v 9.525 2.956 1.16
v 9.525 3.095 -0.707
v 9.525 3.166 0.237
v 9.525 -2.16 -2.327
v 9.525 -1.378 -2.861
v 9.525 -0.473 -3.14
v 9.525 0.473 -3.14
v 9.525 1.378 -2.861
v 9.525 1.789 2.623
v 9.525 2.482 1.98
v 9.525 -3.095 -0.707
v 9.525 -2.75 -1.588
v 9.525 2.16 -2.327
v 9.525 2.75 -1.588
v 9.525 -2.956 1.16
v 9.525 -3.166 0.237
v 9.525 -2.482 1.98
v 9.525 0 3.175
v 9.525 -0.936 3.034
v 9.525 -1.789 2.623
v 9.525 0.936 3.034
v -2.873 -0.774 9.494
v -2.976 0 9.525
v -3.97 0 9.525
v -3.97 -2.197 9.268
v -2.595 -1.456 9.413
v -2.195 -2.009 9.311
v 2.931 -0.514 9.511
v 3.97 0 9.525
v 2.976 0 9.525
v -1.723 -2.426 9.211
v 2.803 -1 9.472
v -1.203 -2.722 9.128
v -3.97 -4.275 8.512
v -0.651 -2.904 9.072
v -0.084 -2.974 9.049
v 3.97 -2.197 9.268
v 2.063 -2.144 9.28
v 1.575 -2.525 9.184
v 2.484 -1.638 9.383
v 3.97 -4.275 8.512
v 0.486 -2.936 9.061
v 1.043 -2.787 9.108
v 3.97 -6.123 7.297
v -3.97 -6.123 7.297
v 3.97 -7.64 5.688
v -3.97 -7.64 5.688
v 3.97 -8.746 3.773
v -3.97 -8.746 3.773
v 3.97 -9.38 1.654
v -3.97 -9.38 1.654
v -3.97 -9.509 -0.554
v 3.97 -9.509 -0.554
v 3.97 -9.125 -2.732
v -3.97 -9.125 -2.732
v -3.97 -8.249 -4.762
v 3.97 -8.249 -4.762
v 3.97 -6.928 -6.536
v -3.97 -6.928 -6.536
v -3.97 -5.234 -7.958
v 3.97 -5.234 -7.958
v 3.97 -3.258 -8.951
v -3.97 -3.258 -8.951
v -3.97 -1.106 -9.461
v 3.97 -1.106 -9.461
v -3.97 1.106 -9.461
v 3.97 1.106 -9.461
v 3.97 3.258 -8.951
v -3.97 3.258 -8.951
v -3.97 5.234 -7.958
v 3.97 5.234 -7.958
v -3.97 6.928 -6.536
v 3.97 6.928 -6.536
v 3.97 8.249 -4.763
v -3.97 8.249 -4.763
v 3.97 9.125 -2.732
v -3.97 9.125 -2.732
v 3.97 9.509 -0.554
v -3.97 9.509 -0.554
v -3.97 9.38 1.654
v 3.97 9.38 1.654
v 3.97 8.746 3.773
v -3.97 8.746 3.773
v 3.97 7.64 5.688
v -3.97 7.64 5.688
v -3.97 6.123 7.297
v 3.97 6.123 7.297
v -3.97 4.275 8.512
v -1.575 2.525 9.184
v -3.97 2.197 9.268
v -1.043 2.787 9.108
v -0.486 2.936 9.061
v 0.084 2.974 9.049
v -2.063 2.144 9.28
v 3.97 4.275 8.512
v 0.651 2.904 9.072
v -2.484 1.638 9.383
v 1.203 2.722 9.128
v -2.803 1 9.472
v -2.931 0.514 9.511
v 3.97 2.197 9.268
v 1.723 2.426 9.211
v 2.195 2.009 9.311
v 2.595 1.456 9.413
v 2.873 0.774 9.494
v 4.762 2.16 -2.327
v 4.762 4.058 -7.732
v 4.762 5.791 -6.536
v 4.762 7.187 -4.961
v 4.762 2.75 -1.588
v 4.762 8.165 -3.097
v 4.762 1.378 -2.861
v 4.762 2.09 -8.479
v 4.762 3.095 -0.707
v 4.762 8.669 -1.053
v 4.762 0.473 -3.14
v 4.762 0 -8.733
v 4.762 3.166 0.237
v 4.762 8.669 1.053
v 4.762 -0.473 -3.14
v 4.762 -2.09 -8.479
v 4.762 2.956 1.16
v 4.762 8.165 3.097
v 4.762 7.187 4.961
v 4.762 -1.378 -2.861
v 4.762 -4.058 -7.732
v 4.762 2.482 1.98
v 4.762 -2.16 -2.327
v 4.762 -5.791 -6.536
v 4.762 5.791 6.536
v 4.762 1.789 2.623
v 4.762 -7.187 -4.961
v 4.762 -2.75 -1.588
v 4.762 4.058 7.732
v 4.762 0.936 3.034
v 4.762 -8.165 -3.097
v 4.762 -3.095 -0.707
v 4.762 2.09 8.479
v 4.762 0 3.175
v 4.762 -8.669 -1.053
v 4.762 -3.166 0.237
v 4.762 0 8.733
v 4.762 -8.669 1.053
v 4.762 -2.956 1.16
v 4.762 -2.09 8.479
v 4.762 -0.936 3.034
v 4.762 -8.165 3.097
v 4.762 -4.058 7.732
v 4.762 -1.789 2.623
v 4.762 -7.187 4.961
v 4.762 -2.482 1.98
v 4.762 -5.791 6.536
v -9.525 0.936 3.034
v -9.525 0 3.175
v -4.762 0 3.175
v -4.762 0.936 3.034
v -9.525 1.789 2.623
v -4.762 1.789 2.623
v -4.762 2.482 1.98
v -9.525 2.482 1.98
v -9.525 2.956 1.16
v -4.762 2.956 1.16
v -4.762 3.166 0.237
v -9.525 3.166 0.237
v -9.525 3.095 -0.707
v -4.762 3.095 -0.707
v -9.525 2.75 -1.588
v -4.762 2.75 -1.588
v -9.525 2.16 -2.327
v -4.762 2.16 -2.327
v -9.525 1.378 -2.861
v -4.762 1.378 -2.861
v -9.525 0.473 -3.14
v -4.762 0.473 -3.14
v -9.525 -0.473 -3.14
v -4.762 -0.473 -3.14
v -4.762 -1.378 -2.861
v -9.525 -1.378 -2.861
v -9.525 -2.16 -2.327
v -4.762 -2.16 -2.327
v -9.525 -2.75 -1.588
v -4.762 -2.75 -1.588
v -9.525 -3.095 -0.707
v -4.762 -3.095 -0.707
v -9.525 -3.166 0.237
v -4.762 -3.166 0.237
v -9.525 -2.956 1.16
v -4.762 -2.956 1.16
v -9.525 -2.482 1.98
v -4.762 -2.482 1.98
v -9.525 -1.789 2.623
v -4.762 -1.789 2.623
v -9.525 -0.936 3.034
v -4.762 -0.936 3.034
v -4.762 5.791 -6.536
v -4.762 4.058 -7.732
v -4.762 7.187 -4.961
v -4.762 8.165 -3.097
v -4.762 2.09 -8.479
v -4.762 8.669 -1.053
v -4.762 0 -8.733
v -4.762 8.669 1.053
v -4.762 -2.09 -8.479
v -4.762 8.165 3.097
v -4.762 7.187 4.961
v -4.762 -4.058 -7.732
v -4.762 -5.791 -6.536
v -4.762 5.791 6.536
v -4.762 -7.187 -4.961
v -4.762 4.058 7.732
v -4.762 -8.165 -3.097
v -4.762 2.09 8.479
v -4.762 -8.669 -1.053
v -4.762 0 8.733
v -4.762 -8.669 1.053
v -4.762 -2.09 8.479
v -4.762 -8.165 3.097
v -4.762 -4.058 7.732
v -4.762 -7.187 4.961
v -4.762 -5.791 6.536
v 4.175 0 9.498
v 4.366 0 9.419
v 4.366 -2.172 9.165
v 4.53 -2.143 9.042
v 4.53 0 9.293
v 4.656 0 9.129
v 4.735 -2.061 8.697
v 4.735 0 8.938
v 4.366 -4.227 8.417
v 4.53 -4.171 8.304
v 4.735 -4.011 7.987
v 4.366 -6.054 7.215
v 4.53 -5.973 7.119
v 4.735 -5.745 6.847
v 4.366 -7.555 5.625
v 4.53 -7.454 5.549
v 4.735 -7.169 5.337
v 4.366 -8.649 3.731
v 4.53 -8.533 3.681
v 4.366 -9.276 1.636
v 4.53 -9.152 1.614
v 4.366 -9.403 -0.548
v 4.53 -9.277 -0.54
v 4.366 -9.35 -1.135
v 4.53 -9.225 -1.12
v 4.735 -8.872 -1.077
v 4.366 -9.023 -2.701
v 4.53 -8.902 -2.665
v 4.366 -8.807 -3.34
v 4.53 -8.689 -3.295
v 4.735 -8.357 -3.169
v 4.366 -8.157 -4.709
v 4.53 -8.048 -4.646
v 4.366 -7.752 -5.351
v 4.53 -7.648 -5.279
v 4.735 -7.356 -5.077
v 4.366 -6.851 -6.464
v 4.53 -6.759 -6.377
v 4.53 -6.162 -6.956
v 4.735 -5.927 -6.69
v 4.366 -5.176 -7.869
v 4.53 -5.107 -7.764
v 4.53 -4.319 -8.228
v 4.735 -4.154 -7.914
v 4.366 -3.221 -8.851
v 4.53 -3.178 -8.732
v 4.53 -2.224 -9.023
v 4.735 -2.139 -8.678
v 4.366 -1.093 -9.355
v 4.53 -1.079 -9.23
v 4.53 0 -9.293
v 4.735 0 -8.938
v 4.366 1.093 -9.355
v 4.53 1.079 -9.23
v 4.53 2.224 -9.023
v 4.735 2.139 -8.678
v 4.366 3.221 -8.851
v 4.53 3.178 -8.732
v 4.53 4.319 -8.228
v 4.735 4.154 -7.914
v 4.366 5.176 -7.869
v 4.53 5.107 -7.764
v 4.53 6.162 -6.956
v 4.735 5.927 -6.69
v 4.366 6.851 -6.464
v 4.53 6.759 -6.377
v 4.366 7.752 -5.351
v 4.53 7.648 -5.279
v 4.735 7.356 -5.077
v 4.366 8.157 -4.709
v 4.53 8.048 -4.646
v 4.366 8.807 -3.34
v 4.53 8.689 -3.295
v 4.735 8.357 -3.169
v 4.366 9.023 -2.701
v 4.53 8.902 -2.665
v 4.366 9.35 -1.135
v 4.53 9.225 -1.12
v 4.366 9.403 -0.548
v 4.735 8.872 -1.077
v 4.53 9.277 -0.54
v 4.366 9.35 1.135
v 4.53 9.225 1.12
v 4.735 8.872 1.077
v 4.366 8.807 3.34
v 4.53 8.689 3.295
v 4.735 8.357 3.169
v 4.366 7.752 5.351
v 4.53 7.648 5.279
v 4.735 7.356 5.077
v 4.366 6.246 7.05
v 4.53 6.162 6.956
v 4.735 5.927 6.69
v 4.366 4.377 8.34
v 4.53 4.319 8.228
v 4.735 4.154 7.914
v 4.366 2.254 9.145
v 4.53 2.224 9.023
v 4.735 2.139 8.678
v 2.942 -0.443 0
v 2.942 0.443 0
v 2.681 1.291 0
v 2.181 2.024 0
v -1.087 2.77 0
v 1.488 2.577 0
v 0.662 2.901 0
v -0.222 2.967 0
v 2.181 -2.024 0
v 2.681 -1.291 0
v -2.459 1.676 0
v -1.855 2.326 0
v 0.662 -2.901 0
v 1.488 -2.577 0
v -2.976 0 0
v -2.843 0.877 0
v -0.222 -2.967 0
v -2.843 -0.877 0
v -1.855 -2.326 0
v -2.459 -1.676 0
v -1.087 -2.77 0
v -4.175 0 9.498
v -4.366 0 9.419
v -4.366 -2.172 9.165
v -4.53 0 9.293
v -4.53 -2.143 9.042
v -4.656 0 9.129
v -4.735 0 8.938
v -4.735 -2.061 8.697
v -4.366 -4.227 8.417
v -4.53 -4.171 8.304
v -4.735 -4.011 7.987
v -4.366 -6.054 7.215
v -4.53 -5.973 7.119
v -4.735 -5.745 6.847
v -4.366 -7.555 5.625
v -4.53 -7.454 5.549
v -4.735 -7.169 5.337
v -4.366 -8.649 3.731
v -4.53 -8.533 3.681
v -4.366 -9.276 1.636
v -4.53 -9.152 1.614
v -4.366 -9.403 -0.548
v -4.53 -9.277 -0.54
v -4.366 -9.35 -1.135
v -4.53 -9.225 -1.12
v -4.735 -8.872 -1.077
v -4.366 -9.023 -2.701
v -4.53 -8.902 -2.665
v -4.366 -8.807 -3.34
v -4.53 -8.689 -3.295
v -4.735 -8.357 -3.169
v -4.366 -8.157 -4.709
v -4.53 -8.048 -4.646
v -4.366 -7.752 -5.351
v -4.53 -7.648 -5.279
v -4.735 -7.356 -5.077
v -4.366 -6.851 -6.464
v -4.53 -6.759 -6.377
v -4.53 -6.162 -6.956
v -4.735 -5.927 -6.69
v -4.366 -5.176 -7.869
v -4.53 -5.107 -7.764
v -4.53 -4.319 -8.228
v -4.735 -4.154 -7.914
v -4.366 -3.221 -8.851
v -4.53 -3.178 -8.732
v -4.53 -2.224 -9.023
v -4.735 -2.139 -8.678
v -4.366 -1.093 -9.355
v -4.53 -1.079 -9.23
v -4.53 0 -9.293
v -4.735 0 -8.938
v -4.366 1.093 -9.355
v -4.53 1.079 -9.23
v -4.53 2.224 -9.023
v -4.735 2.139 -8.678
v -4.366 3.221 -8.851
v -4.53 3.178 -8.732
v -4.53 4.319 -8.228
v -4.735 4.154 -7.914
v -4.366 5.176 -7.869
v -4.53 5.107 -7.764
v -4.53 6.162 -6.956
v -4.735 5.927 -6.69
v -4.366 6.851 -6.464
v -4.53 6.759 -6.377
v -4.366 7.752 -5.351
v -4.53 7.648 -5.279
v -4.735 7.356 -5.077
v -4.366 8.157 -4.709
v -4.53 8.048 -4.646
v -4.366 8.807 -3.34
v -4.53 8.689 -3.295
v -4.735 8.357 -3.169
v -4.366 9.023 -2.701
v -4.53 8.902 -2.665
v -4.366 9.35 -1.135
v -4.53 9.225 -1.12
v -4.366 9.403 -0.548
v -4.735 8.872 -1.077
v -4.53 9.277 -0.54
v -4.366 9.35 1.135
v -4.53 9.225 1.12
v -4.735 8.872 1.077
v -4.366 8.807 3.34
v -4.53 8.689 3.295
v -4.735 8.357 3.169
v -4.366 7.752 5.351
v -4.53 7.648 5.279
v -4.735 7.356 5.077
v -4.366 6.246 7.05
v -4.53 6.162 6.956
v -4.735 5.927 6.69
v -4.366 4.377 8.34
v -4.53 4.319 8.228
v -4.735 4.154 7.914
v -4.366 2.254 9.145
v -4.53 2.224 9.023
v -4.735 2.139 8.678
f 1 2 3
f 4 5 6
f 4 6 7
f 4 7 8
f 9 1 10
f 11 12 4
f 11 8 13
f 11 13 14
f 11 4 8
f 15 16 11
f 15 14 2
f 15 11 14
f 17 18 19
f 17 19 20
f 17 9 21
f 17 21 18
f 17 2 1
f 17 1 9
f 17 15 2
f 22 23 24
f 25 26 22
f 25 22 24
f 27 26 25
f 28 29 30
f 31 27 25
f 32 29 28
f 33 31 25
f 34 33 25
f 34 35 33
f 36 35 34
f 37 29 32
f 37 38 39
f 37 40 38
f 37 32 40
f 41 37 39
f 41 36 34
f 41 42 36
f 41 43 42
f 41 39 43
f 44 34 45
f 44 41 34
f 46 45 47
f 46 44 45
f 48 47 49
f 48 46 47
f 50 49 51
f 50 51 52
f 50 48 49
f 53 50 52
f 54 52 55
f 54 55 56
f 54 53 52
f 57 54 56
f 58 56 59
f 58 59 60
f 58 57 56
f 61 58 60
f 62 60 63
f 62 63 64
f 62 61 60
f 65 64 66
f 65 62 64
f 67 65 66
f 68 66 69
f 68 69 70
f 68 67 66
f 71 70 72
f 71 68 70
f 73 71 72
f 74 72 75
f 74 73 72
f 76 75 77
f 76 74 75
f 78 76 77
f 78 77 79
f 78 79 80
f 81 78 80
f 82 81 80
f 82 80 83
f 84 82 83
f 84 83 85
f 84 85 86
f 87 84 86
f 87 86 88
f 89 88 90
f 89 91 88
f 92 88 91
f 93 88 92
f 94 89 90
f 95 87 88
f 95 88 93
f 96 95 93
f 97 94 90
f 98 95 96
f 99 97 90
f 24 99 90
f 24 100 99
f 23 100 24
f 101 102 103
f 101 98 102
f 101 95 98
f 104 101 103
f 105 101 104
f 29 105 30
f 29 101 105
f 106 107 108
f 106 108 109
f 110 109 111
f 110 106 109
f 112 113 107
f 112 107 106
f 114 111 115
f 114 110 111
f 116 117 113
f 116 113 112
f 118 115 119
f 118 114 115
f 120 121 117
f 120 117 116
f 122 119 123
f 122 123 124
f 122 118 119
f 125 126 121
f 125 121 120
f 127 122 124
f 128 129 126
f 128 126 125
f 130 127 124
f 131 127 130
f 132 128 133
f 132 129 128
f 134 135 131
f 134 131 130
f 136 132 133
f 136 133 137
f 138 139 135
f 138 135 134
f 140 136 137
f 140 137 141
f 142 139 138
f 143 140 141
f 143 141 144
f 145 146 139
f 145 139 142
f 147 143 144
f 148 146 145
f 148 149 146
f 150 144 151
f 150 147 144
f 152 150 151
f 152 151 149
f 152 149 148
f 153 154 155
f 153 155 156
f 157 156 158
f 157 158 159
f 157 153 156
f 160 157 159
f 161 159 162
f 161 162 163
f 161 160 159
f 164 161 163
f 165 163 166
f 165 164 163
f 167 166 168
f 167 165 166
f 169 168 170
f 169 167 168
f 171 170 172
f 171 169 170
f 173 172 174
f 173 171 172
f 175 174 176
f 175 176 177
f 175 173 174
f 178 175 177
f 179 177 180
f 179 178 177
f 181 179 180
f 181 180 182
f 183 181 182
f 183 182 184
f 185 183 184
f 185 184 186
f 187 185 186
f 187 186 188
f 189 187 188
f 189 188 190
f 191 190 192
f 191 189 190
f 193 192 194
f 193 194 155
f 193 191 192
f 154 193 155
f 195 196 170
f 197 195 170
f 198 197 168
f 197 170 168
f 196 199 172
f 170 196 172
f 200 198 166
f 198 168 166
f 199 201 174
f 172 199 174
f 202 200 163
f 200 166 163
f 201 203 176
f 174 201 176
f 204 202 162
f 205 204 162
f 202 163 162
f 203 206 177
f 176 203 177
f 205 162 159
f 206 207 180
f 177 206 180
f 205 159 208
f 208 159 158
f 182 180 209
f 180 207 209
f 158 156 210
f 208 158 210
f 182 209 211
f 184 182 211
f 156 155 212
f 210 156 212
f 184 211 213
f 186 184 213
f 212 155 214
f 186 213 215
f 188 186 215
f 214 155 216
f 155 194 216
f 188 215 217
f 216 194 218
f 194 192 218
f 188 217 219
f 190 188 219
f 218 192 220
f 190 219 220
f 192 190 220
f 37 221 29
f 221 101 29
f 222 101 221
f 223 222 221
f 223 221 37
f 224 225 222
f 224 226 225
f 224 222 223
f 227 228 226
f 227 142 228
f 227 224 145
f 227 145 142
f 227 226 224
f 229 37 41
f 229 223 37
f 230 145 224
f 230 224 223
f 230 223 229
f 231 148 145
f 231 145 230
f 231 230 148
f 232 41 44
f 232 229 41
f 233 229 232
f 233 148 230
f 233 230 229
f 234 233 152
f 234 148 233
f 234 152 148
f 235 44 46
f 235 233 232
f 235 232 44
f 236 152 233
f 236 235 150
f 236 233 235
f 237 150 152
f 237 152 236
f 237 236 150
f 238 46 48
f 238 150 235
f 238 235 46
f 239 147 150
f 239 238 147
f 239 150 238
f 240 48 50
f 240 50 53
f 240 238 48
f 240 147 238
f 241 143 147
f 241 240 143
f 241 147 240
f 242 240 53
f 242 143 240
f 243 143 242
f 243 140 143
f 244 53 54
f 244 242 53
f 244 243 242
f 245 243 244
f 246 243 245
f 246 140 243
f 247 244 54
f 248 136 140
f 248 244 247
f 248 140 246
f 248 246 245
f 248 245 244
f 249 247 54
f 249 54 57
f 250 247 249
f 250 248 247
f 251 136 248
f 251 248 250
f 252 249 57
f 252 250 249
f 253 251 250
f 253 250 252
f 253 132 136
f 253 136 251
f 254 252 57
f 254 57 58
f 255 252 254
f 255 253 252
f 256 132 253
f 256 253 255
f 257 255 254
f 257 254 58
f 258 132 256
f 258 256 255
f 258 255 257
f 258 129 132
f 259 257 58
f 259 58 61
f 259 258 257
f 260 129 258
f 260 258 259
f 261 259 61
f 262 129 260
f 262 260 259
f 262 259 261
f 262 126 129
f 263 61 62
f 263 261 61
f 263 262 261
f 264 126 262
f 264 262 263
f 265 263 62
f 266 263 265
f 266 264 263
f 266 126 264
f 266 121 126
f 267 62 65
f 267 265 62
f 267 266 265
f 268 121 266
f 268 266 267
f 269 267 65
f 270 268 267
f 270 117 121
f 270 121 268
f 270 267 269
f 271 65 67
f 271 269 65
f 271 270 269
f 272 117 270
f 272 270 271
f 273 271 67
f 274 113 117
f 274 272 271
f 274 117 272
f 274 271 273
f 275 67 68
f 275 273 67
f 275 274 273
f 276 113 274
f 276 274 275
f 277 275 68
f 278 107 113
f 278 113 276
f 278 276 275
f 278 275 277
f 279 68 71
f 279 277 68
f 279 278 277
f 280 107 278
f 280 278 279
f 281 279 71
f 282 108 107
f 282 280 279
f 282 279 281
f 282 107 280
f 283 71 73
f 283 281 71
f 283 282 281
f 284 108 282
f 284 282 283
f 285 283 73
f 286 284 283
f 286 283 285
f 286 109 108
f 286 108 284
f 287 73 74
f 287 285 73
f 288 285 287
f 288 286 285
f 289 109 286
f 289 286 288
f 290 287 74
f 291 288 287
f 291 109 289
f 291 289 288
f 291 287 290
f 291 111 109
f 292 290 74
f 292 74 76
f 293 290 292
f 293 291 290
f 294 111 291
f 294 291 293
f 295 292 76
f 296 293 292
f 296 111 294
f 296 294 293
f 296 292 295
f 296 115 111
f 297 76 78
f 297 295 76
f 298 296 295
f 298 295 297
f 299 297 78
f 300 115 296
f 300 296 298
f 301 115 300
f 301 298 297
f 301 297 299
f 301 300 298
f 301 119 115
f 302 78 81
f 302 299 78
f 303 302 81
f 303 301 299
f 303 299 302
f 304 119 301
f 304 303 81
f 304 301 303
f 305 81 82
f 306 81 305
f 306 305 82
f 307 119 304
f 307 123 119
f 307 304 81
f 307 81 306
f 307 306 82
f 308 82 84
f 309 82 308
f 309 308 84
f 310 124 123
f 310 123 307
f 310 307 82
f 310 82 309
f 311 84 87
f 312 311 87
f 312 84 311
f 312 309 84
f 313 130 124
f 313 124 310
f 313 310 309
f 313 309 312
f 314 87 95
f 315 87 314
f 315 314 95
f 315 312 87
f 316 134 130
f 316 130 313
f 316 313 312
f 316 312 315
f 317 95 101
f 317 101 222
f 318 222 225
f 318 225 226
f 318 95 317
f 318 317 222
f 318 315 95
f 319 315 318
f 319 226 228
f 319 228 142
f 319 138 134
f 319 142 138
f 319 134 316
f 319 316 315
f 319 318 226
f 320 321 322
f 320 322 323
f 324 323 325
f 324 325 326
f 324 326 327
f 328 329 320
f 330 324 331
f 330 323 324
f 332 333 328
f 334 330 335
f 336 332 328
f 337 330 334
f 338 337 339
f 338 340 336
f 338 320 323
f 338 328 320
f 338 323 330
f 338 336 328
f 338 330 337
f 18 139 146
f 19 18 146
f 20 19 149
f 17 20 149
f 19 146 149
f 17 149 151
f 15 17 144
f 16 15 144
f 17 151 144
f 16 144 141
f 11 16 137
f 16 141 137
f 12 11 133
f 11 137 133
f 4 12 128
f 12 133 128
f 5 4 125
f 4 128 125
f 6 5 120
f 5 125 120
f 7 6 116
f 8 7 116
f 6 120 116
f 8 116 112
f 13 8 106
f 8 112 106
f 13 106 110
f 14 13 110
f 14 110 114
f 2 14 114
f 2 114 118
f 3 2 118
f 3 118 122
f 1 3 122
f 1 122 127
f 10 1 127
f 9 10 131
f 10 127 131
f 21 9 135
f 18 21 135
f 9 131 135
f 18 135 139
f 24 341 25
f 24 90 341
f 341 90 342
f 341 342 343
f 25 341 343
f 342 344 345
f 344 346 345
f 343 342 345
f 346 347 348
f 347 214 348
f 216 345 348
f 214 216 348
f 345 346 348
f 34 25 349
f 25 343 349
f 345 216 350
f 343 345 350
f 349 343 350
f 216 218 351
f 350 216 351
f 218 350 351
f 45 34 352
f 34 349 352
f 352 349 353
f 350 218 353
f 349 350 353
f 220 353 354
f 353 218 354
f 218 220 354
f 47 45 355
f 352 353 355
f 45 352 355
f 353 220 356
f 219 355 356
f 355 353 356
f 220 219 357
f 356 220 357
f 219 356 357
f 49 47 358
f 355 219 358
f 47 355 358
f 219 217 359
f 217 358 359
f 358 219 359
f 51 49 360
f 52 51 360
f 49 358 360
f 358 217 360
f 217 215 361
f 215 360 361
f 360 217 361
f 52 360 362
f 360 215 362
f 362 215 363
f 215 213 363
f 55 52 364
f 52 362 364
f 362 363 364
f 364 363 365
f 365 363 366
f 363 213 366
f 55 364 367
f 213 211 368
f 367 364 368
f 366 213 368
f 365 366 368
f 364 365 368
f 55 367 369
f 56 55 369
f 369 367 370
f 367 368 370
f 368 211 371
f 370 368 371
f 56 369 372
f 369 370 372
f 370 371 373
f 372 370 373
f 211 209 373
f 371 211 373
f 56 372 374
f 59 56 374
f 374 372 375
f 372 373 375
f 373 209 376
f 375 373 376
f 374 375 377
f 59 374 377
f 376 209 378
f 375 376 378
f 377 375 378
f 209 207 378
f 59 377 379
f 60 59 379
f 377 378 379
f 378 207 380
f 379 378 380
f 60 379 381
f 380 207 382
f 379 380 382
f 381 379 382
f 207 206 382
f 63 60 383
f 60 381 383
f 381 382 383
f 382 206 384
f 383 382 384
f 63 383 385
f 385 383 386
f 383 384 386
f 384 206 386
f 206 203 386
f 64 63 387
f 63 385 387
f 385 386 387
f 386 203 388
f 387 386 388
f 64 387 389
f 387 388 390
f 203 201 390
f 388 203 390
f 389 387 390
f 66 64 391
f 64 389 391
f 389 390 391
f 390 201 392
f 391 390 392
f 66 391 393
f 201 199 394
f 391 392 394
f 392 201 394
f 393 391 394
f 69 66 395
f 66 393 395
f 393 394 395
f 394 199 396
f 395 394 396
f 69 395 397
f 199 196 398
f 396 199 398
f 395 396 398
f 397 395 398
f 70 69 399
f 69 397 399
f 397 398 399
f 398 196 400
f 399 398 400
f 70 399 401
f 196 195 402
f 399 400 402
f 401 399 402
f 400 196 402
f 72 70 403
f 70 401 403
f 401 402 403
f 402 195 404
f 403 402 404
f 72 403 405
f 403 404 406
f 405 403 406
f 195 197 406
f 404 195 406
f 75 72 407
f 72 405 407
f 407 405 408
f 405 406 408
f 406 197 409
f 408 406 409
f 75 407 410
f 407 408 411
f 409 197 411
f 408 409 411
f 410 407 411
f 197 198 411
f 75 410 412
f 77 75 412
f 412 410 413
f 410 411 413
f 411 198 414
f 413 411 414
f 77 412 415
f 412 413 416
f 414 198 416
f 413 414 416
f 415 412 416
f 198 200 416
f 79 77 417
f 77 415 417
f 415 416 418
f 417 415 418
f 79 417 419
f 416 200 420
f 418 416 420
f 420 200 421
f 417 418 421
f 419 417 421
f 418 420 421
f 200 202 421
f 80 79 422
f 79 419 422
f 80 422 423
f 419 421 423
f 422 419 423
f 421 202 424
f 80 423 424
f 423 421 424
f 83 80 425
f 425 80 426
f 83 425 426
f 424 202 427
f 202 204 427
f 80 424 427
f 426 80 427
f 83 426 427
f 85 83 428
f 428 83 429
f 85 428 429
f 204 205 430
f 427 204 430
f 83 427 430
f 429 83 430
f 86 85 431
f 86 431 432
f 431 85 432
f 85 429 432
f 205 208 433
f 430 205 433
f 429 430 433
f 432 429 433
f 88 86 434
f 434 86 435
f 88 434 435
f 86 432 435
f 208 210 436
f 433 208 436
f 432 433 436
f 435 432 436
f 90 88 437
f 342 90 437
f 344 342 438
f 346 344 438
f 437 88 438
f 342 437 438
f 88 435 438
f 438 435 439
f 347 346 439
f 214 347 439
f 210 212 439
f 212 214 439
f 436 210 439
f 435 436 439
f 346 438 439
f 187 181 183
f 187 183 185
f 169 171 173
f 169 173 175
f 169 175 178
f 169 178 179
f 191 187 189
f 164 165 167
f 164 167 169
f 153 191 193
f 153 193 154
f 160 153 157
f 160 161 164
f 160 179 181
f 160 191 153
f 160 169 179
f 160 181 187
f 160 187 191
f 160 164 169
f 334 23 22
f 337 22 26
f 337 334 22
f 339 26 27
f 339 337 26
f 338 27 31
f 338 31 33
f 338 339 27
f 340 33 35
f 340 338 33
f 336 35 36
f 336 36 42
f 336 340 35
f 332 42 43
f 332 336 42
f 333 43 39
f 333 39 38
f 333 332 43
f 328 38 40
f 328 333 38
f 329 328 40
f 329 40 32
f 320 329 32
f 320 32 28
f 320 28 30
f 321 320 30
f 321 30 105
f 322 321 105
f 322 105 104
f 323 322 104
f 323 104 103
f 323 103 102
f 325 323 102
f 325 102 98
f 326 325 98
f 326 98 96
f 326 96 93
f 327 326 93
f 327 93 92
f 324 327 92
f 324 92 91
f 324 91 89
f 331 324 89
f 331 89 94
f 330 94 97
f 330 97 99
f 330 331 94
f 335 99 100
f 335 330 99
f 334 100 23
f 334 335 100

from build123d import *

# Parameters (mm, degrees)
SKETCH1_R           = 9.525
BOSS_EXTRUDE1_DEPTH = 4.7625
SKETCH2_R           = 3.175
BOSS_EXTRUDE2_DEPTH = 4.7625
FILLET1_R           = 0.79248
BOSS_EXTRUDE3_START = 4.7625
SKETCH3_R           = 3.175
BOSS_EXTRUDE3_DEPTH = 4.7625
SKETCH13_R          = 2.97561
CUT_EXTRUDE1_DEPTH  = 17.497784


with BuildPart() as part:
    # Sketch1 → Boss-Extrude1 (new, symmetric)
    with BuildSketch(Plane(origin=(0, 0, 0), x_dir=(0, 0, -1), z_dir=(1, 0, 0))):
        with Locations(Location((0, 0, 0), (0, 0, 180))):
            Circle(SKETCH1_R)
    extrude(amount=BOSS_EXTRUDE1_DEPTH, both=True)

    # Sketch2 → Boss-Extrude2 (add)
    with BuildSketch(Plane(origin=(4.7625, 0, 0), x_dir=(0, 0, -1), z_dir=(1, 0, 0))):
        with Locations(Location((0, 0, 0), (0, 0, 180))):
            Circle(SKETCH2_R)
    extrude(amount=BOSS_EXTRUDE2_DEPTH)

    # Fillet1
    fillet1_edges = [part.edges().sort_by_distance(p)[0] for p in [
        (-4.7625, 0, -9.525),
        (4.7625, 0, -9.525),
    ]]
    fillet(fillet1_edges, radius=FILLET1_R)

    # Sketch3 → Boss-Extrude3 (add)
    with BuildSketch(Plane.ZY.offset(4.7625).offset(BOSS_EXTRUDE3_START)):
        Circle(SKETCH3_R)
    extrude(amount=-BOSS_EXTRUDE3_DEPTH)

    # Sketch13 → Cut-Extrude1 (cut, through all)
    with BuildSketch(Plane.XY):
        with Locations(Location((0, 0, 0), (0, 0, 180))):
            Circle(SKETCH13_R)
    extrude(amount=CUT_EXTRUDE1_DEPTH, mode=Mode.SUBTRACT)


solid = part.part
